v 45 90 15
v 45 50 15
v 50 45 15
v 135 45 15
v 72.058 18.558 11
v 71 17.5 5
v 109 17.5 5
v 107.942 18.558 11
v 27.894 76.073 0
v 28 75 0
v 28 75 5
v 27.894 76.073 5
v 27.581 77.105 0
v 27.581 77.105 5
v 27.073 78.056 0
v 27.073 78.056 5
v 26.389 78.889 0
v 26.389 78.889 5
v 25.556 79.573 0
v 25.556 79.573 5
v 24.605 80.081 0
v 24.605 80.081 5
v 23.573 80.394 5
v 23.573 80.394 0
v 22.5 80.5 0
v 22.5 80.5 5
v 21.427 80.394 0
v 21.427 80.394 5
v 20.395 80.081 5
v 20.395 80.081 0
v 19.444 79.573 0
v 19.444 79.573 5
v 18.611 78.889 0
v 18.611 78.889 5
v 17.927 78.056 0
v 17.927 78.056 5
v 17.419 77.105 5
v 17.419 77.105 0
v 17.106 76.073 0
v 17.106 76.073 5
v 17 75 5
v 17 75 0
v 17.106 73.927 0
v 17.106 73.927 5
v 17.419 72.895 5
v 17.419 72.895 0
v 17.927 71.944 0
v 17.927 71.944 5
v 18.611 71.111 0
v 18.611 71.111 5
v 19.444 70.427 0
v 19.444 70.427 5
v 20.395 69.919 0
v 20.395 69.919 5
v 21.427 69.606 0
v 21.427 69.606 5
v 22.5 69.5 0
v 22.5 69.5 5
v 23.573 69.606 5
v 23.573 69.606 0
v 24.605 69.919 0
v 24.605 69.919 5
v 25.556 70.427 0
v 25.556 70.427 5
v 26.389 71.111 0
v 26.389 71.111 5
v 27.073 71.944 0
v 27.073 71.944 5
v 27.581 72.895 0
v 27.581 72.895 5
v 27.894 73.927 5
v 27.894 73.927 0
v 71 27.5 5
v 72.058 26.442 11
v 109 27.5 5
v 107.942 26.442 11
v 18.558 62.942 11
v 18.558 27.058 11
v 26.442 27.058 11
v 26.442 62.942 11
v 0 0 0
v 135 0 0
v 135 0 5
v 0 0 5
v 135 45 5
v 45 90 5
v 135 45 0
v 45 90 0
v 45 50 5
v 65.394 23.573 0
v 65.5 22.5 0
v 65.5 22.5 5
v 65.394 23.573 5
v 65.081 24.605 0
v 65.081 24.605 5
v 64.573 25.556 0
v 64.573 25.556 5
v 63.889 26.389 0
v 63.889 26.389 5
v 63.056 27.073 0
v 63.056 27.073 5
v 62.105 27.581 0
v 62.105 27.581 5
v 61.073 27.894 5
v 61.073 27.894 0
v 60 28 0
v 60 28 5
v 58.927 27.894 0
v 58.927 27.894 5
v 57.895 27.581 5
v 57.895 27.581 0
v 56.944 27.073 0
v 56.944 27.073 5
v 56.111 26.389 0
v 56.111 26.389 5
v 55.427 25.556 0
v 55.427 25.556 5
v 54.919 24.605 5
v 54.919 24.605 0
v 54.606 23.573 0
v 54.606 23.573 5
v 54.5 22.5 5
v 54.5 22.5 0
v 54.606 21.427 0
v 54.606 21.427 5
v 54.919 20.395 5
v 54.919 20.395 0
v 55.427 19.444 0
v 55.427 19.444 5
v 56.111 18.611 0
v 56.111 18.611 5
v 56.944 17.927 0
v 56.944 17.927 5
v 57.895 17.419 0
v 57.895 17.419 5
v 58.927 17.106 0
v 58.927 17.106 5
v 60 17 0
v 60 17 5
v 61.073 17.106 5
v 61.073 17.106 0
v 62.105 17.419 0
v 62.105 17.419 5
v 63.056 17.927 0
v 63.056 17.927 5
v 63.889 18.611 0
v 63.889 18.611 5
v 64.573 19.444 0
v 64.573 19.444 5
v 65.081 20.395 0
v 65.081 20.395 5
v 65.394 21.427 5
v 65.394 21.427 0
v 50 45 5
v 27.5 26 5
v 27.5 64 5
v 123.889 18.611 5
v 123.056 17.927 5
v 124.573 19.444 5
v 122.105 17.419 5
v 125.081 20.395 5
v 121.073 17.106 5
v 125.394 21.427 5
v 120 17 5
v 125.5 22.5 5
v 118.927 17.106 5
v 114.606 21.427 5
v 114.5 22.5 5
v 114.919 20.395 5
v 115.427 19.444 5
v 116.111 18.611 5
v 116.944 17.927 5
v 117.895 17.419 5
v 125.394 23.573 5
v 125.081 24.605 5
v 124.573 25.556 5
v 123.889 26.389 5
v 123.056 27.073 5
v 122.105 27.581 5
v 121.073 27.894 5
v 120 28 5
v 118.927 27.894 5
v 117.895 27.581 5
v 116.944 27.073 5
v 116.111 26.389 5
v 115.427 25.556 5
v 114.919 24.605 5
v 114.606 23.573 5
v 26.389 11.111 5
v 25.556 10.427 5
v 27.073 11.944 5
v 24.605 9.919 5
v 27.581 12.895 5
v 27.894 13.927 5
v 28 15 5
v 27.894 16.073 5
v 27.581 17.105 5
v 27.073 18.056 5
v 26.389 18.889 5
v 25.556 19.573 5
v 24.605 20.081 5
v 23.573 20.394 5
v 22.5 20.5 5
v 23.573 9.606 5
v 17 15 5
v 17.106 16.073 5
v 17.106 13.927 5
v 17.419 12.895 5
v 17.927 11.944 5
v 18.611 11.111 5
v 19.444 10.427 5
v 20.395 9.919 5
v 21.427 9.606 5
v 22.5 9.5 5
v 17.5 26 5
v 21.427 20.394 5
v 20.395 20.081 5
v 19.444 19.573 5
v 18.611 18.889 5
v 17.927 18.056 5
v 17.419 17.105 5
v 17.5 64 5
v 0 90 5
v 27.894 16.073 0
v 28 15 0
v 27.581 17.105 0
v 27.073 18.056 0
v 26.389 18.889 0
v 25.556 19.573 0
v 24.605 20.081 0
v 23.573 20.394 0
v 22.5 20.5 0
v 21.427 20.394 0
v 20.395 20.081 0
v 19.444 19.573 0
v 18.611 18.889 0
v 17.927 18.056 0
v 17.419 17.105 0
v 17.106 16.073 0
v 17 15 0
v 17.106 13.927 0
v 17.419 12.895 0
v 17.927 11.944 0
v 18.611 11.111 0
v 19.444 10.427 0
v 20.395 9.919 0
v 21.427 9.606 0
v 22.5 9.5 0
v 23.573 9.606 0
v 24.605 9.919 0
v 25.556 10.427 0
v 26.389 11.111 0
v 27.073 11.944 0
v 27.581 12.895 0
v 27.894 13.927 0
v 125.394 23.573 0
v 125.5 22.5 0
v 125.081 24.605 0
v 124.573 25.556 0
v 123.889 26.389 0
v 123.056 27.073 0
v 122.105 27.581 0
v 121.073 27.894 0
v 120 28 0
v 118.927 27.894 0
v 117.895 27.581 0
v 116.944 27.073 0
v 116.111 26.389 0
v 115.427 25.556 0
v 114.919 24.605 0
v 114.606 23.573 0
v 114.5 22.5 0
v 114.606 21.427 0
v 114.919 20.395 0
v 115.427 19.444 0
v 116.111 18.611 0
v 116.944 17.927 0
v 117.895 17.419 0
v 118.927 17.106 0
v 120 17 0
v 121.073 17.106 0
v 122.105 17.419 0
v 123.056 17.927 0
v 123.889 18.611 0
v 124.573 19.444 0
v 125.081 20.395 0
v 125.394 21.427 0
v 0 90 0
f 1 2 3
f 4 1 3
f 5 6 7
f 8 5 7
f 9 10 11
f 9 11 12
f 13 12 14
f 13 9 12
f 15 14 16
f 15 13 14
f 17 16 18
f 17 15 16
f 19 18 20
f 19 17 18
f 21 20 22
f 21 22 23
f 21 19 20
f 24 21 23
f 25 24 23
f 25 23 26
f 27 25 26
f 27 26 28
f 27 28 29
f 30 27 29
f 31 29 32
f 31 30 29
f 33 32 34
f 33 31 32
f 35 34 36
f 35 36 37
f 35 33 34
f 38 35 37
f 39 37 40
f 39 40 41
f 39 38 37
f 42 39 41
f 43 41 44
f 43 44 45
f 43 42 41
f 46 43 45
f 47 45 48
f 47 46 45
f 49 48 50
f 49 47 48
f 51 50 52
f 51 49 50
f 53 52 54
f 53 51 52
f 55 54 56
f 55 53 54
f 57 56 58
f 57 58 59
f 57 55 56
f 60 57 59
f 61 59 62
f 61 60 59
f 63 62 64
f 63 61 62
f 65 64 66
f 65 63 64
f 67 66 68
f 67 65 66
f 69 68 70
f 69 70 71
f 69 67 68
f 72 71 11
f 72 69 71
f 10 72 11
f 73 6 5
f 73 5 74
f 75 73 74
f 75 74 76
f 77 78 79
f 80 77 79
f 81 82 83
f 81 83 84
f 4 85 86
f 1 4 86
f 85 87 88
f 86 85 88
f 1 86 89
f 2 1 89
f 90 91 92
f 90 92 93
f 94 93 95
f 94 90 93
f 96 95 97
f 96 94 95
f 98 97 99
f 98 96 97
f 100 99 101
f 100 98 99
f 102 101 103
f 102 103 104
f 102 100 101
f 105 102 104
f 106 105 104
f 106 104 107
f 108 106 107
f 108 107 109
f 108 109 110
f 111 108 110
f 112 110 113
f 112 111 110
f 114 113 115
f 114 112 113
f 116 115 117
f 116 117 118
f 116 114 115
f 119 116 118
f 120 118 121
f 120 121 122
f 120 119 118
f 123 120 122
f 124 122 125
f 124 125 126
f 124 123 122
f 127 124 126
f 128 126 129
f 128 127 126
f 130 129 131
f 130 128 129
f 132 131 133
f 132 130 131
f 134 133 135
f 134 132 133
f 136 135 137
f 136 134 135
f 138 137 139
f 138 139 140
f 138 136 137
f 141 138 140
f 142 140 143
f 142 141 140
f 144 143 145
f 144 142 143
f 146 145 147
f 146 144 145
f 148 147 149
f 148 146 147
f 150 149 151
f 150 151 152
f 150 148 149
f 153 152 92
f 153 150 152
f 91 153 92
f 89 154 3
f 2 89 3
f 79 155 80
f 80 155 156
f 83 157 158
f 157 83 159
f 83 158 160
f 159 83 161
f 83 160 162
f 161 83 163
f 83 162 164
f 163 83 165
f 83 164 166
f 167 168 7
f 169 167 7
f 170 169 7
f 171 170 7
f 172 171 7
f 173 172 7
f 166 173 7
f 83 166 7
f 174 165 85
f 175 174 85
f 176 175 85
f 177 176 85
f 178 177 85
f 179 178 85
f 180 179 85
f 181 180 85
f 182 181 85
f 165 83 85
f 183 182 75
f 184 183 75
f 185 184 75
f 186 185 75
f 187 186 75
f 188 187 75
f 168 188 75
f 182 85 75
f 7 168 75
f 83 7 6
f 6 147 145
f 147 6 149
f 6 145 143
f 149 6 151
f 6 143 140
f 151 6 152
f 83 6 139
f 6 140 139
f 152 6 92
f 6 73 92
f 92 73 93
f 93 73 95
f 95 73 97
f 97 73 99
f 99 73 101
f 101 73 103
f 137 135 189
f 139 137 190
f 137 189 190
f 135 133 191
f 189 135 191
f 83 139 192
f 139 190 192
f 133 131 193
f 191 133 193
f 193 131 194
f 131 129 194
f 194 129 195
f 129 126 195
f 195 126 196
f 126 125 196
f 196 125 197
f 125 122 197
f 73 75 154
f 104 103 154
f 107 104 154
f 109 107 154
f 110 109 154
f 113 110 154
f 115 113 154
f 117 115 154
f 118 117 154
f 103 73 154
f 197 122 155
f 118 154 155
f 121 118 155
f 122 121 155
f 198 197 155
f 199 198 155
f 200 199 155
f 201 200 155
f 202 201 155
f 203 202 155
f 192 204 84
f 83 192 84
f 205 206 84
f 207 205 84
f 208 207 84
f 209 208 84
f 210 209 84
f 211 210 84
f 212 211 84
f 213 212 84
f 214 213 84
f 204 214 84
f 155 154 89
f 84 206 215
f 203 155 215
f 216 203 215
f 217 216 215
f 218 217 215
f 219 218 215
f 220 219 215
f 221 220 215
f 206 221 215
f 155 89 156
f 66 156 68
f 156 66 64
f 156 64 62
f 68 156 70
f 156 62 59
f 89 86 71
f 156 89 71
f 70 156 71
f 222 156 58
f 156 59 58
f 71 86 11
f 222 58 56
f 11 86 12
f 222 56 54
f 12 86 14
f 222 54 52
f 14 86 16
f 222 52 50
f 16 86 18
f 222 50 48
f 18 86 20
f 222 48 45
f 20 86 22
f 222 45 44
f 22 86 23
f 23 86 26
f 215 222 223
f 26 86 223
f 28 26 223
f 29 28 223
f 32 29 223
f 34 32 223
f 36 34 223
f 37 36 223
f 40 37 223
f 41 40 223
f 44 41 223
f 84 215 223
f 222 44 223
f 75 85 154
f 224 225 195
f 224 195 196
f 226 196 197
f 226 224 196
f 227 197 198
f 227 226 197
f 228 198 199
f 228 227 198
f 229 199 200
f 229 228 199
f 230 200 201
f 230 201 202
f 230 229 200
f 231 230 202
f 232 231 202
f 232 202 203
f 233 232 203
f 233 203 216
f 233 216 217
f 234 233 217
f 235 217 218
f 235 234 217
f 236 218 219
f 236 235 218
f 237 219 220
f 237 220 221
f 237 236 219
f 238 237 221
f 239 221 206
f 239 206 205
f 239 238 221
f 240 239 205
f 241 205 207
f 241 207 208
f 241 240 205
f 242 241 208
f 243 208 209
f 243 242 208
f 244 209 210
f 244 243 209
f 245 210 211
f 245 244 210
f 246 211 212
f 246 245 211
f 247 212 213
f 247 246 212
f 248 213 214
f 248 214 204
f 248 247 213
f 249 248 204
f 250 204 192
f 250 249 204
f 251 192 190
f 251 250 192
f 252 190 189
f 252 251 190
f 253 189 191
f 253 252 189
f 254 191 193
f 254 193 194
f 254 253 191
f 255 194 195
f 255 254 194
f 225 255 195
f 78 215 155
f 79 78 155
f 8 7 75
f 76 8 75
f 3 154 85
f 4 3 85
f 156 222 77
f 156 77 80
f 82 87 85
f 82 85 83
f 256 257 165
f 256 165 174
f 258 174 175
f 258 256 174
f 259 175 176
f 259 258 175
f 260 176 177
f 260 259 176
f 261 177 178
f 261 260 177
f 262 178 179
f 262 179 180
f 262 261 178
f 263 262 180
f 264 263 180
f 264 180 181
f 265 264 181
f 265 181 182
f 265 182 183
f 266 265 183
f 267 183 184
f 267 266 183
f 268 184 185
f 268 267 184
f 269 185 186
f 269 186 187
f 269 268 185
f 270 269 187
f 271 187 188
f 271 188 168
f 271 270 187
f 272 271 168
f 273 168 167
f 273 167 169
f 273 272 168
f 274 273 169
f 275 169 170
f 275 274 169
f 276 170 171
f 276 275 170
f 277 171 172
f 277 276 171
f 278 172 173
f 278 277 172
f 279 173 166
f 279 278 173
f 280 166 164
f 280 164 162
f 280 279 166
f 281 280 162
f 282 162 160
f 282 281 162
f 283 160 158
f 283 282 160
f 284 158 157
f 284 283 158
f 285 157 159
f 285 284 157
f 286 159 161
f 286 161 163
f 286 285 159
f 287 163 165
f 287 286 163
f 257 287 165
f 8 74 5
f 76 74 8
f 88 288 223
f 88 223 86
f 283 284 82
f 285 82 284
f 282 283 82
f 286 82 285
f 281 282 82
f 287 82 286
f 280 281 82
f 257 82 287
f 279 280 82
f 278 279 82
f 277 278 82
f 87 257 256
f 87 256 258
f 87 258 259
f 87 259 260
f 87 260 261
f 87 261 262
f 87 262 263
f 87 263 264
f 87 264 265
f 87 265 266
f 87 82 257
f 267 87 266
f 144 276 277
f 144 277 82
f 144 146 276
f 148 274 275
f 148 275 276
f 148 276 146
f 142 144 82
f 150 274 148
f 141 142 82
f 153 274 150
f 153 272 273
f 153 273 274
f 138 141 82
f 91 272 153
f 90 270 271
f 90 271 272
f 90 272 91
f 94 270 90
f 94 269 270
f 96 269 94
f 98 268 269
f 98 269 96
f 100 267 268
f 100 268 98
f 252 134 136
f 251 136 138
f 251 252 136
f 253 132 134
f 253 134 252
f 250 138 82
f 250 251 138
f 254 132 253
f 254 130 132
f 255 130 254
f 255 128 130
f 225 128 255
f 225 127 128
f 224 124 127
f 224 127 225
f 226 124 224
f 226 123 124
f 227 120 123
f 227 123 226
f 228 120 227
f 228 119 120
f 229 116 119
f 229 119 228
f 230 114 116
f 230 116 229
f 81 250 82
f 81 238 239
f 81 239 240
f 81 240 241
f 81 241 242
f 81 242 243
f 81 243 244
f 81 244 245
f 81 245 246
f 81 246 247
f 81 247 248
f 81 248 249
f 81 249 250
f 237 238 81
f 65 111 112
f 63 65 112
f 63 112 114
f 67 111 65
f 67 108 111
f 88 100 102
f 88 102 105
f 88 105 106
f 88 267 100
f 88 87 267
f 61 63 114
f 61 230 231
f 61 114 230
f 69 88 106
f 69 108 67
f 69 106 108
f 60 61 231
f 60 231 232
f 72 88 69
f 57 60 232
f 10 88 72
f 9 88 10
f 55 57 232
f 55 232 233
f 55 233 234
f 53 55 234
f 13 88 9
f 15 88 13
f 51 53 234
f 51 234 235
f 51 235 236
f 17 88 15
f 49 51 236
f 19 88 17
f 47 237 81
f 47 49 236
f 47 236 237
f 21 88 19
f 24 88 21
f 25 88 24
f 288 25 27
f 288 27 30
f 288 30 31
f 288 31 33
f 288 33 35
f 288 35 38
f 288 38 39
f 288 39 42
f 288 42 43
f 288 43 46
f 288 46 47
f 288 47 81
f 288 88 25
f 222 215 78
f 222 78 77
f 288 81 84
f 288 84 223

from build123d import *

# Parameters (mm, degrees)
ESQUISSE1_R        = 5.5
BOSS_EXTRU_1_DEPTH = 5
ESQUISSE2_W        = 10
ESQUISSE2_H        = 38
ESQUISSE2_W_2      = 38
ESQUISSE2_H_2      = 10
BOSS_EXTRU_2_DEPTH = 6
D_POUILLE3_ANGLE   = 10
BOSS_EXTRU_3_DEPTH = 10
CHANFREIN1_SIZE    = 5


with BuildPart() as part:
    # Esquisse1 → Boss.-Extru.1 (new body)
    with BuildSketch(Plane.XY):
        Polygon((0, 0), (0, 90), (45, 90), (135, 45), (135, 0), align=None)
        with Locations((22.5, 75)):
            Circle(ESQUISSE1_R, mode=Mode.SUBTRACT)
        with Locations((22.5, 15)):
            Circle(ESQUISSE1_R, mode=Mode.SUBTRACT)
        with Locations((120, 22.5)):
            Circle(ESQUISSE1_R, mode=Mode.SUBTRACT)
        with Locations((60, 22.5)):
            Circle(ESQUISSE1_R, mode=Mode.SUBTRACT)
    extrude(amount=BOSS_EXTRU_1_DEPTH)

    # Esquisse2 → Boss.-Extru.2 (add)
    with BuildSketch(Plane.XY.offset(5)):
        with Locations((22.5, 45)):
            Rectangle(ESQUISSE2_W, ESQUISSE2_H)
        with Locations((90, 22.5)):
            Rectangle(ESQUISSE2_W_2, ESQUISSE2_H_2)
    extrude(amount=BOSS_EXTRU_2_DEPTH)

    # Dépouille3
    d_pouille3_faces = [part.faces().sort_by_distance(p)[0] for p in [
        (90, 27.5, 8),
        (109, 22.5, 8),
        (71, 22.5, 8),
        (90, 17.5, 8),
        (22.5, 26, 8),
        (27.5, 45, 8),
        (22.5, 64, 8),
        (17.5, 45, 8),
    ]]
    draft(d_pouille3_faces, Plane.XY.offset(5), D_POUILLE3_ANGLE)

    # Esquisse3 → Boss.-Extru.3 (add)
    with BuildSketch(Plane.XY.offset(5)):
        Polygon((45, 90), (45, 45), (135, 45), align=None)
    extrude(amount=BOSS_EXTRU_3_DEPTH)

    # Chanfrein1
    chanfrein1_edges = [part.edges().sort_by_distance(p)[0] for p in [
        (45, 45, 10),
    ]]
    chamfer(chanfrein1_edges, length=CHANFREIN1_SIZE)


solid = part.part
